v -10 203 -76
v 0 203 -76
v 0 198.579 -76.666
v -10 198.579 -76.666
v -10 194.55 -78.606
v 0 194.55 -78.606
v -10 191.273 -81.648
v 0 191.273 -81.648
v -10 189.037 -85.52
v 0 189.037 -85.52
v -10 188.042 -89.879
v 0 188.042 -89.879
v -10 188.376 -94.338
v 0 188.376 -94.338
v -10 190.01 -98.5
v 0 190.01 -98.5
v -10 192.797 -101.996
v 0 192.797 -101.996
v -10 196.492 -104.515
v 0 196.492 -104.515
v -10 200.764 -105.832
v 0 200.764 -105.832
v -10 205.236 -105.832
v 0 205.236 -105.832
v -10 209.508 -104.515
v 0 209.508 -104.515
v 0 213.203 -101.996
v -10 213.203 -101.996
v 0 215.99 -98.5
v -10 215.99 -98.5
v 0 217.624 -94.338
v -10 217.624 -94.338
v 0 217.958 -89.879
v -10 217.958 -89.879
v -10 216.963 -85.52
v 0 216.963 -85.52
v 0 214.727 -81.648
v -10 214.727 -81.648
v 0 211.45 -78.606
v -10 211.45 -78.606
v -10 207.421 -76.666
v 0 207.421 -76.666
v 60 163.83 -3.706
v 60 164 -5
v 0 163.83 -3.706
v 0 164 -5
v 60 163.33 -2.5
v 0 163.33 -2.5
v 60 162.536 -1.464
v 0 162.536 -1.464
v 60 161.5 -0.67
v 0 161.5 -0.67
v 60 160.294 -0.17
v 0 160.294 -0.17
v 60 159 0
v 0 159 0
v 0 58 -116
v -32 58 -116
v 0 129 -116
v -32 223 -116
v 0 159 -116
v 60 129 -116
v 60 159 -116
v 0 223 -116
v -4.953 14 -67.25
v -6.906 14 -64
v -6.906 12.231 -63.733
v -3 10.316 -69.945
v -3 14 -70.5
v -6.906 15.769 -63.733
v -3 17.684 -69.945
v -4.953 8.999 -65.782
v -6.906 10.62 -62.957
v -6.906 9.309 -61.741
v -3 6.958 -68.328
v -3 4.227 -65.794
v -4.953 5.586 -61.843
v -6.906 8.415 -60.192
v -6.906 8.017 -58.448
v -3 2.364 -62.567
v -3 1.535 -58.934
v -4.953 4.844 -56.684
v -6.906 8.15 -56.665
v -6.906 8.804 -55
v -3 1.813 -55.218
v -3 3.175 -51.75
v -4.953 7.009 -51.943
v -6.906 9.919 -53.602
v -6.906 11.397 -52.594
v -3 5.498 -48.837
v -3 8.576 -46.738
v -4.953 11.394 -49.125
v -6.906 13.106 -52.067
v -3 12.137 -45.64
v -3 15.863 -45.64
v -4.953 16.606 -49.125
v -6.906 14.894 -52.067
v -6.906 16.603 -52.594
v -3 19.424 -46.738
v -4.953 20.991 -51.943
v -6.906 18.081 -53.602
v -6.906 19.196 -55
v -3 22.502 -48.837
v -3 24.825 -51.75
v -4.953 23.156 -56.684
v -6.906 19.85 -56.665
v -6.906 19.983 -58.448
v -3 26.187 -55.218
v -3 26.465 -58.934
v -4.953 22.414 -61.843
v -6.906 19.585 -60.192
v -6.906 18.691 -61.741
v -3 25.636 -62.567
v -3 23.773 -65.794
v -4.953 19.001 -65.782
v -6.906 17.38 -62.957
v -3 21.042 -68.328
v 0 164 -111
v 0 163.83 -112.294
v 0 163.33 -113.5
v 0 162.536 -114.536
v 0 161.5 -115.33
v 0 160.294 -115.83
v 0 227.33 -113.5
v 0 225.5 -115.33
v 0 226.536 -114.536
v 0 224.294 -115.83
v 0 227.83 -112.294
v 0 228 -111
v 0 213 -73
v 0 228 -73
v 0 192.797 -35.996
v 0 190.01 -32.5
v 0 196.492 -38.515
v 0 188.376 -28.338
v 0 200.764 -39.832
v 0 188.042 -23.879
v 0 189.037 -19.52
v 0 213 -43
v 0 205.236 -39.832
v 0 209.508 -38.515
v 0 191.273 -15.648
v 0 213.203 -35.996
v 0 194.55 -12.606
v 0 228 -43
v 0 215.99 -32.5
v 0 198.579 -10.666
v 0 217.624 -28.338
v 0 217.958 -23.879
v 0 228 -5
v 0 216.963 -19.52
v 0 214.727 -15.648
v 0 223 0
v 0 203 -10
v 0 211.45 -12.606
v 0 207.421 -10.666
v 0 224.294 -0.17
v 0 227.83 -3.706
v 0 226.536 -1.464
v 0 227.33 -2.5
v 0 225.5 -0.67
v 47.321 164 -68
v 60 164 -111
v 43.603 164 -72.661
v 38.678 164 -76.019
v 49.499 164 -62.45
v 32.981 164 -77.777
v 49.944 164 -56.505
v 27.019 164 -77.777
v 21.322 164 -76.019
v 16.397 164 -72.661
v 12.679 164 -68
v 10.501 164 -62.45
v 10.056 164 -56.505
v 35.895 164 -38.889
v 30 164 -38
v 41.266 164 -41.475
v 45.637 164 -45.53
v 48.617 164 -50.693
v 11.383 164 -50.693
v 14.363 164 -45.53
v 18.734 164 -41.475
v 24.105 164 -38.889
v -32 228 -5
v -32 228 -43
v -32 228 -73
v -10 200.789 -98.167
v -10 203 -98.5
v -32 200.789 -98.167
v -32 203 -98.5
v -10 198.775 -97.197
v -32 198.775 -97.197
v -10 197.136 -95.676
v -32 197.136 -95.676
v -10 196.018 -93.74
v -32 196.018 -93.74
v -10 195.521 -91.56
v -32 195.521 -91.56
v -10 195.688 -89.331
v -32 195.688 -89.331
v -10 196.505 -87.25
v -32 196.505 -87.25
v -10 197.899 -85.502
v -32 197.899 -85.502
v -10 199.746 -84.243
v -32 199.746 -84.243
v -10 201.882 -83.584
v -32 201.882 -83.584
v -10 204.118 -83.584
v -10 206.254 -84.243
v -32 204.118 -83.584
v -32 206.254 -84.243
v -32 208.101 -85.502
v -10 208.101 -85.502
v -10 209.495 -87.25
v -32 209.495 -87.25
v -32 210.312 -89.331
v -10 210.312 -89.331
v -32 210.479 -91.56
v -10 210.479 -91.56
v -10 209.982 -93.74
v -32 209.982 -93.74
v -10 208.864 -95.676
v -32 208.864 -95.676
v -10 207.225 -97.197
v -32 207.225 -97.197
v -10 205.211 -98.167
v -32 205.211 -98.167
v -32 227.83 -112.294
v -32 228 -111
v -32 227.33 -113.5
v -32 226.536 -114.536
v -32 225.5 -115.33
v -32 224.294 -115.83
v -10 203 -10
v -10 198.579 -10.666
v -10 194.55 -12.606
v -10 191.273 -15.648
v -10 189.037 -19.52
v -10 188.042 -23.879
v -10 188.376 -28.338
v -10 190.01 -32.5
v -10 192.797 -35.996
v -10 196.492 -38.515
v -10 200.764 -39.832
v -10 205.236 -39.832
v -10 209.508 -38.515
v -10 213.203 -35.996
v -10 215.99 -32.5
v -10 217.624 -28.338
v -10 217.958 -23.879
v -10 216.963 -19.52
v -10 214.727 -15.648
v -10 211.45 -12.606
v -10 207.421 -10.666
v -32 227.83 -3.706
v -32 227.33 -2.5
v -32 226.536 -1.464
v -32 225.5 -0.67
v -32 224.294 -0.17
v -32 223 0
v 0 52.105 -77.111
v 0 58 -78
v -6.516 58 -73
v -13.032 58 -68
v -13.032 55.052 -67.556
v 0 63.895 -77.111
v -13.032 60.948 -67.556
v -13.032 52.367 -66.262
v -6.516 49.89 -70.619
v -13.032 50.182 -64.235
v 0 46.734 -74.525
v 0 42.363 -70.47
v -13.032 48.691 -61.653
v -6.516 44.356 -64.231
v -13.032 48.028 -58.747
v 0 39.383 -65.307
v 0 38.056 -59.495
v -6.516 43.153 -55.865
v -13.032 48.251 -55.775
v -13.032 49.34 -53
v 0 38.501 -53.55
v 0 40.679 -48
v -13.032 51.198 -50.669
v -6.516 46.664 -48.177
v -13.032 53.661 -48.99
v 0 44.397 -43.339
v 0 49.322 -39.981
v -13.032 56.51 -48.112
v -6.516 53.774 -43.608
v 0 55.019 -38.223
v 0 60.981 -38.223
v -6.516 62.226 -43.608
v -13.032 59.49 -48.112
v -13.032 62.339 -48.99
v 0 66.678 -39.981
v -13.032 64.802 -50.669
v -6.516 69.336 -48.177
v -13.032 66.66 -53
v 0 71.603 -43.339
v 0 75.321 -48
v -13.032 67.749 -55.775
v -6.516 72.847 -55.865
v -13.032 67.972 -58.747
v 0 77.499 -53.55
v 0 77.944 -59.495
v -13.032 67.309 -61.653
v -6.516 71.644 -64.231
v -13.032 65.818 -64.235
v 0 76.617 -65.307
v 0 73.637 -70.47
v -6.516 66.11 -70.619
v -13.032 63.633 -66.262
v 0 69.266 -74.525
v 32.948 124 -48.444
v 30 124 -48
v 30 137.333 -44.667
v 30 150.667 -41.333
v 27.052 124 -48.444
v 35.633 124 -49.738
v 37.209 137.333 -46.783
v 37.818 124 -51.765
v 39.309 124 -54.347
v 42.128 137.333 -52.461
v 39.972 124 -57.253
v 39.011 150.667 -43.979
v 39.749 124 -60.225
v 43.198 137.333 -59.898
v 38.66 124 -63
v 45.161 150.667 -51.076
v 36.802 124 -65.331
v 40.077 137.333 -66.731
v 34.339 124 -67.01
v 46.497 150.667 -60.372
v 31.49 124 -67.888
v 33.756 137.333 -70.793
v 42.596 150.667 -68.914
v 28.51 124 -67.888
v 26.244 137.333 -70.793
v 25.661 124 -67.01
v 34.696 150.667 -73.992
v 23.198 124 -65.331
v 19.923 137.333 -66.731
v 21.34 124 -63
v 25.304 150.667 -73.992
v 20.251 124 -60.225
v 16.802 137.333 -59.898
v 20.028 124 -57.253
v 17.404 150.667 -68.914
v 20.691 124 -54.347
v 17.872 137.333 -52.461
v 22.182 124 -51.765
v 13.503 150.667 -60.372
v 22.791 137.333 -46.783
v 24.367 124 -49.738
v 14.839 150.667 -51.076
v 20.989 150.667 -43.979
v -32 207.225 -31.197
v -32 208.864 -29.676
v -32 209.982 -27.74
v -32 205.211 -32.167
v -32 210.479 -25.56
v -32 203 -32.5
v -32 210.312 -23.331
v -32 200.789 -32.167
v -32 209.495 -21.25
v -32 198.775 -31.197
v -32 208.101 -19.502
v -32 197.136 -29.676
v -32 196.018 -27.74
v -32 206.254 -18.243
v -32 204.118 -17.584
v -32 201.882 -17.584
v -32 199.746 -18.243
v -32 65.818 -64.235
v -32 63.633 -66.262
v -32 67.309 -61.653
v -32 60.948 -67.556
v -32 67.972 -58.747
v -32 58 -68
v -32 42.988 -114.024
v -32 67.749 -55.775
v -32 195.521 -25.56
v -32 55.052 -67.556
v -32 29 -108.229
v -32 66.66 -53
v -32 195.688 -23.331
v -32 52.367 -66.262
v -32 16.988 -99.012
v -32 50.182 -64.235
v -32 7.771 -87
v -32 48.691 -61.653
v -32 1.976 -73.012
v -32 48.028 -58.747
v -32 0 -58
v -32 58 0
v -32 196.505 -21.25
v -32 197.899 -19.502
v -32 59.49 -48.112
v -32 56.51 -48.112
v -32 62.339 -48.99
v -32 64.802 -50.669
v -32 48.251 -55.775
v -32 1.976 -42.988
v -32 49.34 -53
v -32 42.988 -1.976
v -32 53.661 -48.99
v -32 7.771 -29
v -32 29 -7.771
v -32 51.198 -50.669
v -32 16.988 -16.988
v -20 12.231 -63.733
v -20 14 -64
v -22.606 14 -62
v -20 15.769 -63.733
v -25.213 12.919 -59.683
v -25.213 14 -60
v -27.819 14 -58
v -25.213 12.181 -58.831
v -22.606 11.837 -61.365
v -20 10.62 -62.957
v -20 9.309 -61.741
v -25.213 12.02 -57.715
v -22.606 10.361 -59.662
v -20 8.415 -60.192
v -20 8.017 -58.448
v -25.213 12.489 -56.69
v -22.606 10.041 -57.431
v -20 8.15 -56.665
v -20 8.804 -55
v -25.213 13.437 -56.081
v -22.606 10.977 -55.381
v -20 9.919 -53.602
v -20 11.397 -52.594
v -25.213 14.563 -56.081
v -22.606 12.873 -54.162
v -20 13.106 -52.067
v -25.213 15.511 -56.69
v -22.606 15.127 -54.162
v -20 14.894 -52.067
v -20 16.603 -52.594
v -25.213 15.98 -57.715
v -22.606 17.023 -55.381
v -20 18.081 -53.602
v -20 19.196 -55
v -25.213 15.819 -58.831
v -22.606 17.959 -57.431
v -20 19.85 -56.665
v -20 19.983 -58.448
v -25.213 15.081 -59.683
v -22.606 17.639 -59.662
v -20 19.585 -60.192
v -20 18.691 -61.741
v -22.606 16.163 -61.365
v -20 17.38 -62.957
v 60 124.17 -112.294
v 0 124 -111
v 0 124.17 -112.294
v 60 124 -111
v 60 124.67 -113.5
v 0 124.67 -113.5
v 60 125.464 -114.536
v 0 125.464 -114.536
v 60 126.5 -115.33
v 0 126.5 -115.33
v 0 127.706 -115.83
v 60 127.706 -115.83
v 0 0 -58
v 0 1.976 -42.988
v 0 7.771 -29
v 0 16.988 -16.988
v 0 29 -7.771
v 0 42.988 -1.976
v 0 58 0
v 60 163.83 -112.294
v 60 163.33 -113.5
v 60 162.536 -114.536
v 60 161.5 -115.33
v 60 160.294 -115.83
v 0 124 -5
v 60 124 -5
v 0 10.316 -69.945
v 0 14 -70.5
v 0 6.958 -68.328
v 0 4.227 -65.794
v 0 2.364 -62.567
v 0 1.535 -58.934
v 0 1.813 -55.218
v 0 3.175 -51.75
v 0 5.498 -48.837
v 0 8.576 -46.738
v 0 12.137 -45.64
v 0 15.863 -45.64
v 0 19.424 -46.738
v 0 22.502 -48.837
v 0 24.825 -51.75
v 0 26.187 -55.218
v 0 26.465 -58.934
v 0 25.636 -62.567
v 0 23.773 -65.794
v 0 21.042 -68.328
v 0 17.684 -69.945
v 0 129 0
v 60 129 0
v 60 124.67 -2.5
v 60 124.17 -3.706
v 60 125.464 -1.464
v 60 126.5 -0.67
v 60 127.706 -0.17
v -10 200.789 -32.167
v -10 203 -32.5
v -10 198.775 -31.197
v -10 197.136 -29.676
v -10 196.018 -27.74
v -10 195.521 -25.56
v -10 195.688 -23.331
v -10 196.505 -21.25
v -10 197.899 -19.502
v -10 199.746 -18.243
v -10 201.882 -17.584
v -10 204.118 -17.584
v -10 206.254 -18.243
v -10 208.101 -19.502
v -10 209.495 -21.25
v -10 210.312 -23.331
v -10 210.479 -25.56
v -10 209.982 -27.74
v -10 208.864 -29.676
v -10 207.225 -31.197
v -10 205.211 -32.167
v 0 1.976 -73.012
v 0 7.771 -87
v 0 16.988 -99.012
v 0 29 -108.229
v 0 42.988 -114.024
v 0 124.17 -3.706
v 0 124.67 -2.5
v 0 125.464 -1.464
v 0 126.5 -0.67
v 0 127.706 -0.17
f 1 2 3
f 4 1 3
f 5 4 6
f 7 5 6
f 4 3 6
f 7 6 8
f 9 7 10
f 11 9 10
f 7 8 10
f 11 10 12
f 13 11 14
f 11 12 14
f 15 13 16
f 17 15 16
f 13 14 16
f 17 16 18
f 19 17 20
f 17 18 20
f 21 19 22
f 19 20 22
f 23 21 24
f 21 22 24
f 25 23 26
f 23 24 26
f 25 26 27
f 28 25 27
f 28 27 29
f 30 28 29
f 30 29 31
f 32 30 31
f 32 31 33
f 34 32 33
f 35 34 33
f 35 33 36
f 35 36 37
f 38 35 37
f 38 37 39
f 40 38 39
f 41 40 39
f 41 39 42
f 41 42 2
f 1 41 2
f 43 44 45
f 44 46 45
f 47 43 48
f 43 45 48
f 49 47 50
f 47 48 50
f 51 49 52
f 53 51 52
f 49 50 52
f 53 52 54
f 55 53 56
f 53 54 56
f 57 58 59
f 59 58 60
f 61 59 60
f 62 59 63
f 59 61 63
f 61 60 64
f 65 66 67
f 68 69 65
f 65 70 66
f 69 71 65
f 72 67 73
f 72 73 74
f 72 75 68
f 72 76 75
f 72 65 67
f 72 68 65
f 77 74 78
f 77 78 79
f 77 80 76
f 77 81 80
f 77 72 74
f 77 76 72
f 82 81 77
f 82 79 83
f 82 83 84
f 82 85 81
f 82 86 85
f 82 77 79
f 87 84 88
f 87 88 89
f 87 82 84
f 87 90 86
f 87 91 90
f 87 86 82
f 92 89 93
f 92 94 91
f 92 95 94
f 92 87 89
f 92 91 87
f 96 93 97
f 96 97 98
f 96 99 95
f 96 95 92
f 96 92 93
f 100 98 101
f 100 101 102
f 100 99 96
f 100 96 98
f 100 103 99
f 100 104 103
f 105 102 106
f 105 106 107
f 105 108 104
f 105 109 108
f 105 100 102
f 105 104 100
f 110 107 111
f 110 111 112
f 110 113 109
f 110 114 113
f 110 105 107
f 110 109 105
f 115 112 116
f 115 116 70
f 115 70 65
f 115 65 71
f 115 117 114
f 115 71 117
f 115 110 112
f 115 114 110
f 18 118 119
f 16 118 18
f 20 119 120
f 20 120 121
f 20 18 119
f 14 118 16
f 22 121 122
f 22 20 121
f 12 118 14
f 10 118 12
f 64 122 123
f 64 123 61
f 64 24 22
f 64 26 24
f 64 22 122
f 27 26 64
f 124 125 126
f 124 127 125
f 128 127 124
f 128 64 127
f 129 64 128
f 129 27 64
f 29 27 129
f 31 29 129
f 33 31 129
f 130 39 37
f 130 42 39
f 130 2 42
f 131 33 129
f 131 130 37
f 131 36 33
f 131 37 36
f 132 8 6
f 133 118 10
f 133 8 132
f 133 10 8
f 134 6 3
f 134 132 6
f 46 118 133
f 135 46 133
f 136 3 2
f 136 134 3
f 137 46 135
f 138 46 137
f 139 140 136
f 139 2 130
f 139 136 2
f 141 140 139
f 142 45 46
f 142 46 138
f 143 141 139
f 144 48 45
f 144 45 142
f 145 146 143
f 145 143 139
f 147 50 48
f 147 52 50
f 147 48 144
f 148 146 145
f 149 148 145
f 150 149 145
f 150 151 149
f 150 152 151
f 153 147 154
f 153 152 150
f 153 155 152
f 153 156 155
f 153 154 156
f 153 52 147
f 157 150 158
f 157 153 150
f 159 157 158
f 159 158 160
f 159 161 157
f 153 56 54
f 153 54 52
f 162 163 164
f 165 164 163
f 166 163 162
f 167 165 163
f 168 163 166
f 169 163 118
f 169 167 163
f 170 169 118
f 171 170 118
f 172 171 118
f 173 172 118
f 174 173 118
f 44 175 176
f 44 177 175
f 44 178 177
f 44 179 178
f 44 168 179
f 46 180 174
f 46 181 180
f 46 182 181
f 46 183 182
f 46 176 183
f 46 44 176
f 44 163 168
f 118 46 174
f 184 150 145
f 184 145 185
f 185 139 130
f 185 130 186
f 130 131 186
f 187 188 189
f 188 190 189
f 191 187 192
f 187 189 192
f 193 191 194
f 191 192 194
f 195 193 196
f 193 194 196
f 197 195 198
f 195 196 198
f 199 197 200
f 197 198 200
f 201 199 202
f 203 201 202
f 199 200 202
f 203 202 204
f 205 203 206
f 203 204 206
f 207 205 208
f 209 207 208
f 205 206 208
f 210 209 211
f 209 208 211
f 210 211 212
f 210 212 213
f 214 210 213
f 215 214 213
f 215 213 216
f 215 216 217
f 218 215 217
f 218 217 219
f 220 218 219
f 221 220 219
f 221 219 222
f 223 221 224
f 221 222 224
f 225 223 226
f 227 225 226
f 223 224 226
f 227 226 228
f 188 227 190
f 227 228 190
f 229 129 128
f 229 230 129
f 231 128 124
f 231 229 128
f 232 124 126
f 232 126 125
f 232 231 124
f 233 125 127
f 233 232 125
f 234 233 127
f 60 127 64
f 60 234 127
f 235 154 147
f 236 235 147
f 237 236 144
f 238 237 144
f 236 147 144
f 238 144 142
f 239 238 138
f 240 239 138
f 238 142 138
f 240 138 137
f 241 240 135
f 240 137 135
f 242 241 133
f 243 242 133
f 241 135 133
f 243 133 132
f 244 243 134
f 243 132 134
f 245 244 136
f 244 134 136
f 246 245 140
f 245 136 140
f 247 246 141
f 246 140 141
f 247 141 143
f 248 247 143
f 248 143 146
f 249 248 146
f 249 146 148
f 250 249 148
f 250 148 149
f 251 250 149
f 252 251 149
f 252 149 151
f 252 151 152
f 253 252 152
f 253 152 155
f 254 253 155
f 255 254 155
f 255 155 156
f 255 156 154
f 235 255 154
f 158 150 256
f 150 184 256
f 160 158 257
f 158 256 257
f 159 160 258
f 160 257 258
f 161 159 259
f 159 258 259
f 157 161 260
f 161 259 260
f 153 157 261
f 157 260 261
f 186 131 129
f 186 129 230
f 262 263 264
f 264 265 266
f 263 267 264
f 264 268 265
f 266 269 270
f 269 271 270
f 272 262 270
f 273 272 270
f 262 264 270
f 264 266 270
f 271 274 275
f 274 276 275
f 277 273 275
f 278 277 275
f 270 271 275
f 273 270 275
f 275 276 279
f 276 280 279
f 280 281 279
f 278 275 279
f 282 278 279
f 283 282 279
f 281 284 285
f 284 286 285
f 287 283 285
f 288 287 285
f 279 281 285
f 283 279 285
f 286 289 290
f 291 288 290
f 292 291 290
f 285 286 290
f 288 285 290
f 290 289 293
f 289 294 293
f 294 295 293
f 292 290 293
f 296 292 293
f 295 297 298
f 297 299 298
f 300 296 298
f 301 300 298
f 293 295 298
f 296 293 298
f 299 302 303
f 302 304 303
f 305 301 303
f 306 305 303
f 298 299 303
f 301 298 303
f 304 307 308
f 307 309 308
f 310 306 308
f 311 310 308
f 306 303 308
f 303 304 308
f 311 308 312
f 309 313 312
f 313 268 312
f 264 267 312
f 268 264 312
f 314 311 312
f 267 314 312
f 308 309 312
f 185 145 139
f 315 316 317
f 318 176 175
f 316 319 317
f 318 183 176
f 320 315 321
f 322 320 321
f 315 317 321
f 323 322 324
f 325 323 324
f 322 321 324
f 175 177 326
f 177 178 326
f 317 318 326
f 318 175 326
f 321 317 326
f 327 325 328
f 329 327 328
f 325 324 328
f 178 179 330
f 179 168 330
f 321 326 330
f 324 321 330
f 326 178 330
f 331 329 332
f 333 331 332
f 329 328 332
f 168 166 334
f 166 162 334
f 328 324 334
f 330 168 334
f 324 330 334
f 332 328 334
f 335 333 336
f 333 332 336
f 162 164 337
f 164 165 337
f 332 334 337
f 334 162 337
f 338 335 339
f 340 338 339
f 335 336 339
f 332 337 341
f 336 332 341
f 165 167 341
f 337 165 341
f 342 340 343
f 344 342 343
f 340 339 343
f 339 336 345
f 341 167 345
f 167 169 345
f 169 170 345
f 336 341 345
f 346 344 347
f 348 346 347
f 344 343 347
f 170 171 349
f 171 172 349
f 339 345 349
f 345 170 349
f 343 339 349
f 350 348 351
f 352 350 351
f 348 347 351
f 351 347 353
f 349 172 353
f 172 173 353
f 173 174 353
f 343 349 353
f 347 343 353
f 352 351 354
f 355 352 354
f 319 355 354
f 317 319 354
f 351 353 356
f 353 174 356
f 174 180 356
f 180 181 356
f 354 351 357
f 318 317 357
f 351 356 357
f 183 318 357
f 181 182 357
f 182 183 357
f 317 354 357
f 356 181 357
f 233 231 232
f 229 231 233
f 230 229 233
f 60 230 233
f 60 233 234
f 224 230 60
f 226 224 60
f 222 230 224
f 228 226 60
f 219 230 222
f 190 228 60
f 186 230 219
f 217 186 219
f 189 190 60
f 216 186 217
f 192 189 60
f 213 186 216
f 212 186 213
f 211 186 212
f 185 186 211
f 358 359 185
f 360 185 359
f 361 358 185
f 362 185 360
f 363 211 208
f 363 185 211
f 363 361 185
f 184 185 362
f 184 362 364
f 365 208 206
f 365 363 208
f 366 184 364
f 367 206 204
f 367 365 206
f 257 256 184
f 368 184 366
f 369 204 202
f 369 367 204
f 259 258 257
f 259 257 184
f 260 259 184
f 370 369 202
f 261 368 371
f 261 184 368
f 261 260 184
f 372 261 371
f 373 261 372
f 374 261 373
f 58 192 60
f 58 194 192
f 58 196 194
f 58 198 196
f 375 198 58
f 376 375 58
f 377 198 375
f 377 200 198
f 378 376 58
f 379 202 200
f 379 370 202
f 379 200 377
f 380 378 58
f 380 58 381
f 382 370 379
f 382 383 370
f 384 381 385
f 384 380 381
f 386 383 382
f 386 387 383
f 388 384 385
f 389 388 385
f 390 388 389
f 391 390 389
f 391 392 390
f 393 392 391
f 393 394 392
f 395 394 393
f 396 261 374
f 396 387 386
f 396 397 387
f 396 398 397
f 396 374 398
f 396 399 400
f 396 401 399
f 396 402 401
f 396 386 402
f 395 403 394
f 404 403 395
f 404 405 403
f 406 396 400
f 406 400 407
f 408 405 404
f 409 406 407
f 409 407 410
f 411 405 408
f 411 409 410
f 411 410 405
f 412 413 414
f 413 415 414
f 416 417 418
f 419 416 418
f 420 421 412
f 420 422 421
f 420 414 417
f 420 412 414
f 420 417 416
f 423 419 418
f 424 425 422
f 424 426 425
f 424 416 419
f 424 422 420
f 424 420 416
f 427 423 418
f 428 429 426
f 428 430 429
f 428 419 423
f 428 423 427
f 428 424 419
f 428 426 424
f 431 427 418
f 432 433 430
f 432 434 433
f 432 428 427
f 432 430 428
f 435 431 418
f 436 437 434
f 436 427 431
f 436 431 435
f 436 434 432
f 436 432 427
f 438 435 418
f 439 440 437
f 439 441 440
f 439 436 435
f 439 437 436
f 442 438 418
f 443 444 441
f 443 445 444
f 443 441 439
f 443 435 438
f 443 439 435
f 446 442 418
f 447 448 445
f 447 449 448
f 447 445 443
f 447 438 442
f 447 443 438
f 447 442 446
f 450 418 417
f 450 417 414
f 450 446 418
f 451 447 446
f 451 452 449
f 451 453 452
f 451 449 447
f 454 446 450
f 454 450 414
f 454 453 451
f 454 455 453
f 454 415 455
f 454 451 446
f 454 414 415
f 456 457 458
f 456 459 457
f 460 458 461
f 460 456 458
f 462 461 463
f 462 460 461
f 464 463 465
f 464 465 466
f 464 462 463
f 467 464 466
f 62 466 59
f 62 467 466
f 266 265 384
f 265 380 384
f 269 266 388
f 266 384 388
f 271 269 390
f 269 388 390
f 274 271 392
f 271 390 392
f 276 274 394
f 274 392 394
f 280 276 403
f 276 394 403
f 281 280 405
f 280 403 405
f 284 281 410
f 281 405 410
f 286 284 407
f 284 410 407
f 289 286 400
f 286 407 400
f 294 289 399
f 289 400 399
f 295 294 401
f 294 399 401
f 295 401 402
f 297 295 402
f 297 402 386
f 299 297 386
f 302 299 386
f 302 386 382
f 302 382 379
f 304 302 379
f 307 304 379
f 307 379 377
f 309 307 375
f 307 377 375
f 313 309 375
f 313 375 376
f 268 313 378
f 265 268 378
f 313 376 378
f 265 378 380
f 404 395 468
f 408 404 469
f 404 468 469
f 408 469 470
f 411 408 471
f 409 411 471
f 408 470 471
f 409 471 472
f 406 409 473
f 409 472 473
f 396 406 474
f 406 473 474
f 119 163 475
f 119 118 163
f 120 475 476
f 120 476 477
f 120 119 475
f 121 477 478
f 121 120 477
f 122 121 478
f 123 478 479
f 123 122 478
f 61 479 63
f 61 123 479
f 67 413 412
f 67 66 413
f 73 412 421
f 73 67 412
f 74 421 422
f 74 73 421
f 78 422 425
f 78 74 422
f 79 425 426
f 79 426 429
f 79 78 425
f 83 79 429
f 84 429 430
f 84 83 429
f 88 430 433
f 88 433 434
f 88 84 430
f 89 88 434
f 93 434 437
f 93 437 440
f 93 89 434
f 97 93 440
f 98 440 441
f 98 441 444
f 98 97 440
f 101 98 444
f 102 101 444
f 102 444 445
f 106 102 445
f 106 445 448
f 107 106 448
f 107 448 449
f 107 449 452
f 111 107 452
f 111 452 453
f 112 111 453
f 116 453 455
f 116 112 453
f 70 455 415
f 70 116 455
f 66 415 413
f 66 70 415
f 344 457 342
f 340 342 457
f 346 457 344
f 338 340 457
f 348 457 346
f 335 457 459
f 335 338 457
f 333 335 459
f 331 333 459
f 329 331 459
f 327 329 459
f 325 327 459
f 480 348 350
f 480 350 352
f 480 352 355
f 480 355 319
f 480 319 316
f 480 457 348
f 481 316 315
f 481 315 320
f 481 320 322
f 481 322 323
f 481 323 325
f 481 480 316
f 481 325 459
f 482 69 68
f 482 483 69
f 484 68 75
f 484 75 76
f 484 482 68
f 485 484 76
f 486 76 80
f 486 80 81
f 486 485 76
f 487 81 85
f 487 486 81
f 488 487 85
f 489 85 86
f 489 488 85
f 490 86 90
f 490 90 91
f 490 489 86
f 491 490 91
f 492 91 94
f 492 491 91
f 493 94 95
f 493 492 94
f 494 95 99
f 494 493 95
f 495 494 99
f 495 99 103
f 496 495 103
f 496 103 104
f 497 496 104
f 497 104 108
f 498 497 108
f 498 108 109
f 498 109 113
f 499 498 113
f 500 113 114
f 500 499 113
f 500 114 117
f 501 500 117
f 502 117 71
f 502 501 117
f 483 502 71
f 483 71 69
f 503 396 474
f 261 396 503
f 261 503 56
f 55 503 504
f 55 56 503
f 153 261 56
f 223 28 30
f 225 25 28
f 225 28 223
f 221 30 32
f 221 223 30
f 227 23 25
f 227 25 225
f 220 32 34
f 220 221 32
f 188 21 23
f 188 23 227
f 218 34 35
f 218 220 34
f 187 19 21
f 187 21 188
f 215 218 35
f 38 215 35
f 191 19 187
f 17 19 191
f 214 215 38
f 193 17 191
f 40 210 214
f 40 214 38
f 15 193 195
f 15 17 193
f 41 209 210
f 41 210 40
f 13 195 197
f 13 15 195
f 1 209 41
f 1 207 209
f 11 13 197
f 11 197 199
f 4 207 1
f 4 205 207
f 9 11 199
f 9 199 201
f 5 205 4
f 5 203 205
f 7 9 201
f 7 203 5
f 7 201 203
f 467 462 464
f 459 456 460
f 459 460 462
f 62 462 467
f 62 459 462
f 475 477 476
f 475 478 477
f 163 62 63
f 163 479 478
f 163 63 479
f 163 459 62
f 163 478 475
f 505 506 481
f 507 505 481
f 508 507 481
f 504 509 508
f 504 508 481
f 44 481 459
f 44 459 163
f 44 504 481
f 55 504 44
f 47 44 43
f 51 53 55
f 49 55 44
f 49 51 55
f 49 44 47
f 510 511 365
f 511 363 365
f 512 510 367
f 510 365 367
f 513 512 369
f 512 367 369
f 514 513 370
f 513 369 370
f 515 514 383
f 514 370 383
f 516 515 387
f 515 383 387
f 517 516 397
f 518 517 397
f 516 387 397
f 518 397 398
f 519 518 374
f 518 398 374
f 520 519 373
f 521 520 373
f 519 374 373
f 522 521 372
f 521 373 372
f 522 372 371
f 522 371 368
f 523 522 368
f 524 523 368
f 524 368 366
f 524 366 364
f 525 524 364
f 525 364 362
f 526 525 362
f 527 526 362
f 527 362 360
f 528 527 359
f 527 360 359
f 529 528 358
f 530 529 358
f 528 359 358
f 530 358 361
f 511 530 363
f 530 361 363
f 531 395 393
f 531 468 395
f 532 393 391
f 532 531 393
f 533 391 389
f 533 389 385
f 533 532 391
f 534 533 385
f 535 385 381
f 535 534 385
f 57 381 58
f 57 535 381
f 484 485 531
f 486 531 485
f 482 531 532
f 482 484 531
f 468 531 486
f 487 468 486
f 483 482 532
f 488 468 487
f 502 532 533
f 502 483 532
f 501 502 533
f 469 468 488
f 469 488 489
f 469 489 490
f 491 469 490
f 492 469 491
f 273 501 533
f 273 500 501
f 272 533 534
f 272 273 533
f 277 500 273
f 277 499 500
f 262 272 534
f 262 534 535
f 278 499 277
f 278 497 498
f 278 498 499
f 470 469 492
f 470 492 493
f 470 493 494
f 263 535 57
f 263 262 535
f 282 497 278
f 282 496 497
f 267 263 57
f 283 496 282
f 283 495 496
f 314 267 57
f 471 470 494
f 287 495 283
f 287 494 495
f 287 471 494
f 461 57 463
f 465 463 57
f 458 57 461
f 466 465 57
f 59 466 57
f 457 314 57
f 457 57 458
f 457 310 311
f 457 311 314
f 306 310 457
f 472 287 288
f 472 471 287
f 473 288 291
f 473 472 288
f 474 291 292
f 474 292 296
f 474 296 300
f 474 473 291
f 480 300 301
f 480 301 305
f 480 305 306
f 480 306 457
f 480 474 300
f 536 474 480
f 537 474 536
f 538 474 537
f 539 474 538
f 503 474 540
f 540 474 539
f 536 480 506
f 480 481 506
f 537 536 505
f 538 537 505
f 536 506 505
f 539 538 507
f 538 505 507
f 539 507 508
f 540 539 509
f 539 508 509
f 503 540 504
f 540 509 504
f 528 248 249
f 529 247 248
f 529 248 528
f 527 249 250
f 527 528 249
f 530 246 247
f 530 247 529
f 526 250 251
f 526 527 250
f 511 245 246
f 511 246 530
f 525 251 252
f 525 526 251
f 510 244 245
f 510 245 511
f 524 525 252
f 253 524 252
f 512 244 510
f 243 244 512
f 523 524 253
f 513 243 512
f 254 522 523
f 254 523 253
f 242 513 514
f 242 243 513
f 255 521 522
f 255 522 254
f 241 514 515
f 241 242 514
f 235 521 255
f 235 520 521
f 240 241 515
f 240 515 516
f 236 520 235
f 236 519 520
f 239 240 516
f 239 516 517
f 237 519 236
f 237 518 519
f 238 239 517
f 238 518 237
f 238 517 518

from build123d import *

# Parameters (mm, degrees)
SALIENTE_EXTRUIR3_DEPTH                              = 116
REDONDEO1_R                                          = 5
REDONDEO2_R                                          = 58
REFRENTADO_PARA_TORNILLO_CON_CABEZA_PLAN_D           = 15
REFRENTADO_PARA_TORNILLO_CON_CABEZA_PLAN_CBORE_D     = 30
REFRENTADO_PARA_TORNILLO_CON_CABEZA_PLAN_CBORE_DEPTH = 10
AVELLANADO_PARA_TORNILLO_CON_CABEZA_PLAN_D           = 20
AVELLANADO_PARA_TORNILLO_CON_CABEZA_PLAN_CSINK_D     = 40
AVELLANADO_PARA_TORNILLO_CON_CABEZA_PLAN_CSINK_ANGLE = 75
CORTAR_EXTRUIR1_DEPTH                                = 15


with BuildPart() as part:
    # Croquis1 → Saliente-Extruir3 (new body)
    with BuildSketch(Plane.XY):
        Polygon((0, 164), (0, 228), (-32, 228), (-32, 0), (0, 0), (0, 124), (60, 124), (60, 164), align=None)
    extrude(amount=-SALIENTE_EXTRUIR3_DEPTH)

    # Redondeo1
    redondeo1_edges = [part.edges().sort_by_distance(p)[0] for p in [
        (30, 164, 0),
        (30, 124, 0),
        (30, 164, -116),
        (-16, 228, -116),
        (30, 124, -116),
        (-16, 228, 0),
    ]]
    fillet(redondeo1_edges, radius=REDONDEO1_R)

    # Redondeo2
    redondeo2_edges = [part.edges().sort_by_distance(p)[0] for p in [
        (-16, 0, -116),
        (-16, 0, 0),
    ]]
    fillet(redondeo2_edges, radius=REDONDEO2_R - 0.0001)  # a hair under: the kernel refuses the full size

    # Refrentado para tornillo con cabeza plana de M51 (through all)
    with Locations(Plane(origin=(0, 203, -25), x_dir=(0, 0, 1), z_dir=(1, 0, 0))):
        with Locations((0, 0), (-66, 0)):
            CounterBoreHole(REFRENTADO_PARA_TORNILLO_CON_CABEZA_PLAN_D / 2, REFRENTADO_PARA_TORNILLO_CON_CABEZA_PLAN_CBORE_D / 2, REFRENTADO_PARA_TORNILLO_CON_CABEZA_PLAN_CBORE_DEPTH)

    # Avellanado para tornillo con cabeza plana avellanada de M51 (through all)
    with Locations(Plane(origin=(0, 58, -58), x_dir=(0, 0, 1), z_dir=(1, 0, 0))):
        with Locations((0, 0)):
            CounterSinkHole(AVELLANADO_PARA_TORNILLO_CON_CABEZA_PLAN_D / 2, AVELLANADO_PARA_TORNILLO_CON_CABEZA_PLAN_CSINK_D / 2, counter_sink_angle=AVELLANADO_PARA_TORNILLO_CON_CABEZA_PLAN_CSINK_ANGLE)

    # Croquis6 → Taladro1 (revolve, cut)
    with BuildSketch(Plane(origin=(0, 14, -58), x_dir=(0, 0, -1), z_dir=(0, 1, 0))):
        Polygon((0, 0), (0, 27.819352237), (6, 20), (6, 6.905594024), (12.5, 3), (12.5, 0), align=None)
    revolve(axis=Axis((6.130023899, 14, -58), (-1, 0, 0)), mode=Mode.SUBTRACT)

    # Croquis9 → Taladro2 (revolve, cut)
    with BuildSketch(Plane(origin=(30, 164, -58), x_dir=(0, 0, 1), z_dir=(1, 0, 0))):
        Polygon((0, 0), (0, 40), (10, 40), (20, 0), align=None)
    revolve(axis=Axis((30, 54, -58), (0, 1, 0)), mode=Mode.SUBTRACT)

    # Croquis10 → Cortar-Extruir1 (cut, symmetric)
    with BuildSketch(Plane.XY.offset(-58)):
        Polygon((-32, 228), (0, 228), (0, 213), align=None)
    extrude(amount=CORTAR_EXTRUIR1_DEPTH, both=True, mode=Mode.SUBTRACT)


solid = part.part
